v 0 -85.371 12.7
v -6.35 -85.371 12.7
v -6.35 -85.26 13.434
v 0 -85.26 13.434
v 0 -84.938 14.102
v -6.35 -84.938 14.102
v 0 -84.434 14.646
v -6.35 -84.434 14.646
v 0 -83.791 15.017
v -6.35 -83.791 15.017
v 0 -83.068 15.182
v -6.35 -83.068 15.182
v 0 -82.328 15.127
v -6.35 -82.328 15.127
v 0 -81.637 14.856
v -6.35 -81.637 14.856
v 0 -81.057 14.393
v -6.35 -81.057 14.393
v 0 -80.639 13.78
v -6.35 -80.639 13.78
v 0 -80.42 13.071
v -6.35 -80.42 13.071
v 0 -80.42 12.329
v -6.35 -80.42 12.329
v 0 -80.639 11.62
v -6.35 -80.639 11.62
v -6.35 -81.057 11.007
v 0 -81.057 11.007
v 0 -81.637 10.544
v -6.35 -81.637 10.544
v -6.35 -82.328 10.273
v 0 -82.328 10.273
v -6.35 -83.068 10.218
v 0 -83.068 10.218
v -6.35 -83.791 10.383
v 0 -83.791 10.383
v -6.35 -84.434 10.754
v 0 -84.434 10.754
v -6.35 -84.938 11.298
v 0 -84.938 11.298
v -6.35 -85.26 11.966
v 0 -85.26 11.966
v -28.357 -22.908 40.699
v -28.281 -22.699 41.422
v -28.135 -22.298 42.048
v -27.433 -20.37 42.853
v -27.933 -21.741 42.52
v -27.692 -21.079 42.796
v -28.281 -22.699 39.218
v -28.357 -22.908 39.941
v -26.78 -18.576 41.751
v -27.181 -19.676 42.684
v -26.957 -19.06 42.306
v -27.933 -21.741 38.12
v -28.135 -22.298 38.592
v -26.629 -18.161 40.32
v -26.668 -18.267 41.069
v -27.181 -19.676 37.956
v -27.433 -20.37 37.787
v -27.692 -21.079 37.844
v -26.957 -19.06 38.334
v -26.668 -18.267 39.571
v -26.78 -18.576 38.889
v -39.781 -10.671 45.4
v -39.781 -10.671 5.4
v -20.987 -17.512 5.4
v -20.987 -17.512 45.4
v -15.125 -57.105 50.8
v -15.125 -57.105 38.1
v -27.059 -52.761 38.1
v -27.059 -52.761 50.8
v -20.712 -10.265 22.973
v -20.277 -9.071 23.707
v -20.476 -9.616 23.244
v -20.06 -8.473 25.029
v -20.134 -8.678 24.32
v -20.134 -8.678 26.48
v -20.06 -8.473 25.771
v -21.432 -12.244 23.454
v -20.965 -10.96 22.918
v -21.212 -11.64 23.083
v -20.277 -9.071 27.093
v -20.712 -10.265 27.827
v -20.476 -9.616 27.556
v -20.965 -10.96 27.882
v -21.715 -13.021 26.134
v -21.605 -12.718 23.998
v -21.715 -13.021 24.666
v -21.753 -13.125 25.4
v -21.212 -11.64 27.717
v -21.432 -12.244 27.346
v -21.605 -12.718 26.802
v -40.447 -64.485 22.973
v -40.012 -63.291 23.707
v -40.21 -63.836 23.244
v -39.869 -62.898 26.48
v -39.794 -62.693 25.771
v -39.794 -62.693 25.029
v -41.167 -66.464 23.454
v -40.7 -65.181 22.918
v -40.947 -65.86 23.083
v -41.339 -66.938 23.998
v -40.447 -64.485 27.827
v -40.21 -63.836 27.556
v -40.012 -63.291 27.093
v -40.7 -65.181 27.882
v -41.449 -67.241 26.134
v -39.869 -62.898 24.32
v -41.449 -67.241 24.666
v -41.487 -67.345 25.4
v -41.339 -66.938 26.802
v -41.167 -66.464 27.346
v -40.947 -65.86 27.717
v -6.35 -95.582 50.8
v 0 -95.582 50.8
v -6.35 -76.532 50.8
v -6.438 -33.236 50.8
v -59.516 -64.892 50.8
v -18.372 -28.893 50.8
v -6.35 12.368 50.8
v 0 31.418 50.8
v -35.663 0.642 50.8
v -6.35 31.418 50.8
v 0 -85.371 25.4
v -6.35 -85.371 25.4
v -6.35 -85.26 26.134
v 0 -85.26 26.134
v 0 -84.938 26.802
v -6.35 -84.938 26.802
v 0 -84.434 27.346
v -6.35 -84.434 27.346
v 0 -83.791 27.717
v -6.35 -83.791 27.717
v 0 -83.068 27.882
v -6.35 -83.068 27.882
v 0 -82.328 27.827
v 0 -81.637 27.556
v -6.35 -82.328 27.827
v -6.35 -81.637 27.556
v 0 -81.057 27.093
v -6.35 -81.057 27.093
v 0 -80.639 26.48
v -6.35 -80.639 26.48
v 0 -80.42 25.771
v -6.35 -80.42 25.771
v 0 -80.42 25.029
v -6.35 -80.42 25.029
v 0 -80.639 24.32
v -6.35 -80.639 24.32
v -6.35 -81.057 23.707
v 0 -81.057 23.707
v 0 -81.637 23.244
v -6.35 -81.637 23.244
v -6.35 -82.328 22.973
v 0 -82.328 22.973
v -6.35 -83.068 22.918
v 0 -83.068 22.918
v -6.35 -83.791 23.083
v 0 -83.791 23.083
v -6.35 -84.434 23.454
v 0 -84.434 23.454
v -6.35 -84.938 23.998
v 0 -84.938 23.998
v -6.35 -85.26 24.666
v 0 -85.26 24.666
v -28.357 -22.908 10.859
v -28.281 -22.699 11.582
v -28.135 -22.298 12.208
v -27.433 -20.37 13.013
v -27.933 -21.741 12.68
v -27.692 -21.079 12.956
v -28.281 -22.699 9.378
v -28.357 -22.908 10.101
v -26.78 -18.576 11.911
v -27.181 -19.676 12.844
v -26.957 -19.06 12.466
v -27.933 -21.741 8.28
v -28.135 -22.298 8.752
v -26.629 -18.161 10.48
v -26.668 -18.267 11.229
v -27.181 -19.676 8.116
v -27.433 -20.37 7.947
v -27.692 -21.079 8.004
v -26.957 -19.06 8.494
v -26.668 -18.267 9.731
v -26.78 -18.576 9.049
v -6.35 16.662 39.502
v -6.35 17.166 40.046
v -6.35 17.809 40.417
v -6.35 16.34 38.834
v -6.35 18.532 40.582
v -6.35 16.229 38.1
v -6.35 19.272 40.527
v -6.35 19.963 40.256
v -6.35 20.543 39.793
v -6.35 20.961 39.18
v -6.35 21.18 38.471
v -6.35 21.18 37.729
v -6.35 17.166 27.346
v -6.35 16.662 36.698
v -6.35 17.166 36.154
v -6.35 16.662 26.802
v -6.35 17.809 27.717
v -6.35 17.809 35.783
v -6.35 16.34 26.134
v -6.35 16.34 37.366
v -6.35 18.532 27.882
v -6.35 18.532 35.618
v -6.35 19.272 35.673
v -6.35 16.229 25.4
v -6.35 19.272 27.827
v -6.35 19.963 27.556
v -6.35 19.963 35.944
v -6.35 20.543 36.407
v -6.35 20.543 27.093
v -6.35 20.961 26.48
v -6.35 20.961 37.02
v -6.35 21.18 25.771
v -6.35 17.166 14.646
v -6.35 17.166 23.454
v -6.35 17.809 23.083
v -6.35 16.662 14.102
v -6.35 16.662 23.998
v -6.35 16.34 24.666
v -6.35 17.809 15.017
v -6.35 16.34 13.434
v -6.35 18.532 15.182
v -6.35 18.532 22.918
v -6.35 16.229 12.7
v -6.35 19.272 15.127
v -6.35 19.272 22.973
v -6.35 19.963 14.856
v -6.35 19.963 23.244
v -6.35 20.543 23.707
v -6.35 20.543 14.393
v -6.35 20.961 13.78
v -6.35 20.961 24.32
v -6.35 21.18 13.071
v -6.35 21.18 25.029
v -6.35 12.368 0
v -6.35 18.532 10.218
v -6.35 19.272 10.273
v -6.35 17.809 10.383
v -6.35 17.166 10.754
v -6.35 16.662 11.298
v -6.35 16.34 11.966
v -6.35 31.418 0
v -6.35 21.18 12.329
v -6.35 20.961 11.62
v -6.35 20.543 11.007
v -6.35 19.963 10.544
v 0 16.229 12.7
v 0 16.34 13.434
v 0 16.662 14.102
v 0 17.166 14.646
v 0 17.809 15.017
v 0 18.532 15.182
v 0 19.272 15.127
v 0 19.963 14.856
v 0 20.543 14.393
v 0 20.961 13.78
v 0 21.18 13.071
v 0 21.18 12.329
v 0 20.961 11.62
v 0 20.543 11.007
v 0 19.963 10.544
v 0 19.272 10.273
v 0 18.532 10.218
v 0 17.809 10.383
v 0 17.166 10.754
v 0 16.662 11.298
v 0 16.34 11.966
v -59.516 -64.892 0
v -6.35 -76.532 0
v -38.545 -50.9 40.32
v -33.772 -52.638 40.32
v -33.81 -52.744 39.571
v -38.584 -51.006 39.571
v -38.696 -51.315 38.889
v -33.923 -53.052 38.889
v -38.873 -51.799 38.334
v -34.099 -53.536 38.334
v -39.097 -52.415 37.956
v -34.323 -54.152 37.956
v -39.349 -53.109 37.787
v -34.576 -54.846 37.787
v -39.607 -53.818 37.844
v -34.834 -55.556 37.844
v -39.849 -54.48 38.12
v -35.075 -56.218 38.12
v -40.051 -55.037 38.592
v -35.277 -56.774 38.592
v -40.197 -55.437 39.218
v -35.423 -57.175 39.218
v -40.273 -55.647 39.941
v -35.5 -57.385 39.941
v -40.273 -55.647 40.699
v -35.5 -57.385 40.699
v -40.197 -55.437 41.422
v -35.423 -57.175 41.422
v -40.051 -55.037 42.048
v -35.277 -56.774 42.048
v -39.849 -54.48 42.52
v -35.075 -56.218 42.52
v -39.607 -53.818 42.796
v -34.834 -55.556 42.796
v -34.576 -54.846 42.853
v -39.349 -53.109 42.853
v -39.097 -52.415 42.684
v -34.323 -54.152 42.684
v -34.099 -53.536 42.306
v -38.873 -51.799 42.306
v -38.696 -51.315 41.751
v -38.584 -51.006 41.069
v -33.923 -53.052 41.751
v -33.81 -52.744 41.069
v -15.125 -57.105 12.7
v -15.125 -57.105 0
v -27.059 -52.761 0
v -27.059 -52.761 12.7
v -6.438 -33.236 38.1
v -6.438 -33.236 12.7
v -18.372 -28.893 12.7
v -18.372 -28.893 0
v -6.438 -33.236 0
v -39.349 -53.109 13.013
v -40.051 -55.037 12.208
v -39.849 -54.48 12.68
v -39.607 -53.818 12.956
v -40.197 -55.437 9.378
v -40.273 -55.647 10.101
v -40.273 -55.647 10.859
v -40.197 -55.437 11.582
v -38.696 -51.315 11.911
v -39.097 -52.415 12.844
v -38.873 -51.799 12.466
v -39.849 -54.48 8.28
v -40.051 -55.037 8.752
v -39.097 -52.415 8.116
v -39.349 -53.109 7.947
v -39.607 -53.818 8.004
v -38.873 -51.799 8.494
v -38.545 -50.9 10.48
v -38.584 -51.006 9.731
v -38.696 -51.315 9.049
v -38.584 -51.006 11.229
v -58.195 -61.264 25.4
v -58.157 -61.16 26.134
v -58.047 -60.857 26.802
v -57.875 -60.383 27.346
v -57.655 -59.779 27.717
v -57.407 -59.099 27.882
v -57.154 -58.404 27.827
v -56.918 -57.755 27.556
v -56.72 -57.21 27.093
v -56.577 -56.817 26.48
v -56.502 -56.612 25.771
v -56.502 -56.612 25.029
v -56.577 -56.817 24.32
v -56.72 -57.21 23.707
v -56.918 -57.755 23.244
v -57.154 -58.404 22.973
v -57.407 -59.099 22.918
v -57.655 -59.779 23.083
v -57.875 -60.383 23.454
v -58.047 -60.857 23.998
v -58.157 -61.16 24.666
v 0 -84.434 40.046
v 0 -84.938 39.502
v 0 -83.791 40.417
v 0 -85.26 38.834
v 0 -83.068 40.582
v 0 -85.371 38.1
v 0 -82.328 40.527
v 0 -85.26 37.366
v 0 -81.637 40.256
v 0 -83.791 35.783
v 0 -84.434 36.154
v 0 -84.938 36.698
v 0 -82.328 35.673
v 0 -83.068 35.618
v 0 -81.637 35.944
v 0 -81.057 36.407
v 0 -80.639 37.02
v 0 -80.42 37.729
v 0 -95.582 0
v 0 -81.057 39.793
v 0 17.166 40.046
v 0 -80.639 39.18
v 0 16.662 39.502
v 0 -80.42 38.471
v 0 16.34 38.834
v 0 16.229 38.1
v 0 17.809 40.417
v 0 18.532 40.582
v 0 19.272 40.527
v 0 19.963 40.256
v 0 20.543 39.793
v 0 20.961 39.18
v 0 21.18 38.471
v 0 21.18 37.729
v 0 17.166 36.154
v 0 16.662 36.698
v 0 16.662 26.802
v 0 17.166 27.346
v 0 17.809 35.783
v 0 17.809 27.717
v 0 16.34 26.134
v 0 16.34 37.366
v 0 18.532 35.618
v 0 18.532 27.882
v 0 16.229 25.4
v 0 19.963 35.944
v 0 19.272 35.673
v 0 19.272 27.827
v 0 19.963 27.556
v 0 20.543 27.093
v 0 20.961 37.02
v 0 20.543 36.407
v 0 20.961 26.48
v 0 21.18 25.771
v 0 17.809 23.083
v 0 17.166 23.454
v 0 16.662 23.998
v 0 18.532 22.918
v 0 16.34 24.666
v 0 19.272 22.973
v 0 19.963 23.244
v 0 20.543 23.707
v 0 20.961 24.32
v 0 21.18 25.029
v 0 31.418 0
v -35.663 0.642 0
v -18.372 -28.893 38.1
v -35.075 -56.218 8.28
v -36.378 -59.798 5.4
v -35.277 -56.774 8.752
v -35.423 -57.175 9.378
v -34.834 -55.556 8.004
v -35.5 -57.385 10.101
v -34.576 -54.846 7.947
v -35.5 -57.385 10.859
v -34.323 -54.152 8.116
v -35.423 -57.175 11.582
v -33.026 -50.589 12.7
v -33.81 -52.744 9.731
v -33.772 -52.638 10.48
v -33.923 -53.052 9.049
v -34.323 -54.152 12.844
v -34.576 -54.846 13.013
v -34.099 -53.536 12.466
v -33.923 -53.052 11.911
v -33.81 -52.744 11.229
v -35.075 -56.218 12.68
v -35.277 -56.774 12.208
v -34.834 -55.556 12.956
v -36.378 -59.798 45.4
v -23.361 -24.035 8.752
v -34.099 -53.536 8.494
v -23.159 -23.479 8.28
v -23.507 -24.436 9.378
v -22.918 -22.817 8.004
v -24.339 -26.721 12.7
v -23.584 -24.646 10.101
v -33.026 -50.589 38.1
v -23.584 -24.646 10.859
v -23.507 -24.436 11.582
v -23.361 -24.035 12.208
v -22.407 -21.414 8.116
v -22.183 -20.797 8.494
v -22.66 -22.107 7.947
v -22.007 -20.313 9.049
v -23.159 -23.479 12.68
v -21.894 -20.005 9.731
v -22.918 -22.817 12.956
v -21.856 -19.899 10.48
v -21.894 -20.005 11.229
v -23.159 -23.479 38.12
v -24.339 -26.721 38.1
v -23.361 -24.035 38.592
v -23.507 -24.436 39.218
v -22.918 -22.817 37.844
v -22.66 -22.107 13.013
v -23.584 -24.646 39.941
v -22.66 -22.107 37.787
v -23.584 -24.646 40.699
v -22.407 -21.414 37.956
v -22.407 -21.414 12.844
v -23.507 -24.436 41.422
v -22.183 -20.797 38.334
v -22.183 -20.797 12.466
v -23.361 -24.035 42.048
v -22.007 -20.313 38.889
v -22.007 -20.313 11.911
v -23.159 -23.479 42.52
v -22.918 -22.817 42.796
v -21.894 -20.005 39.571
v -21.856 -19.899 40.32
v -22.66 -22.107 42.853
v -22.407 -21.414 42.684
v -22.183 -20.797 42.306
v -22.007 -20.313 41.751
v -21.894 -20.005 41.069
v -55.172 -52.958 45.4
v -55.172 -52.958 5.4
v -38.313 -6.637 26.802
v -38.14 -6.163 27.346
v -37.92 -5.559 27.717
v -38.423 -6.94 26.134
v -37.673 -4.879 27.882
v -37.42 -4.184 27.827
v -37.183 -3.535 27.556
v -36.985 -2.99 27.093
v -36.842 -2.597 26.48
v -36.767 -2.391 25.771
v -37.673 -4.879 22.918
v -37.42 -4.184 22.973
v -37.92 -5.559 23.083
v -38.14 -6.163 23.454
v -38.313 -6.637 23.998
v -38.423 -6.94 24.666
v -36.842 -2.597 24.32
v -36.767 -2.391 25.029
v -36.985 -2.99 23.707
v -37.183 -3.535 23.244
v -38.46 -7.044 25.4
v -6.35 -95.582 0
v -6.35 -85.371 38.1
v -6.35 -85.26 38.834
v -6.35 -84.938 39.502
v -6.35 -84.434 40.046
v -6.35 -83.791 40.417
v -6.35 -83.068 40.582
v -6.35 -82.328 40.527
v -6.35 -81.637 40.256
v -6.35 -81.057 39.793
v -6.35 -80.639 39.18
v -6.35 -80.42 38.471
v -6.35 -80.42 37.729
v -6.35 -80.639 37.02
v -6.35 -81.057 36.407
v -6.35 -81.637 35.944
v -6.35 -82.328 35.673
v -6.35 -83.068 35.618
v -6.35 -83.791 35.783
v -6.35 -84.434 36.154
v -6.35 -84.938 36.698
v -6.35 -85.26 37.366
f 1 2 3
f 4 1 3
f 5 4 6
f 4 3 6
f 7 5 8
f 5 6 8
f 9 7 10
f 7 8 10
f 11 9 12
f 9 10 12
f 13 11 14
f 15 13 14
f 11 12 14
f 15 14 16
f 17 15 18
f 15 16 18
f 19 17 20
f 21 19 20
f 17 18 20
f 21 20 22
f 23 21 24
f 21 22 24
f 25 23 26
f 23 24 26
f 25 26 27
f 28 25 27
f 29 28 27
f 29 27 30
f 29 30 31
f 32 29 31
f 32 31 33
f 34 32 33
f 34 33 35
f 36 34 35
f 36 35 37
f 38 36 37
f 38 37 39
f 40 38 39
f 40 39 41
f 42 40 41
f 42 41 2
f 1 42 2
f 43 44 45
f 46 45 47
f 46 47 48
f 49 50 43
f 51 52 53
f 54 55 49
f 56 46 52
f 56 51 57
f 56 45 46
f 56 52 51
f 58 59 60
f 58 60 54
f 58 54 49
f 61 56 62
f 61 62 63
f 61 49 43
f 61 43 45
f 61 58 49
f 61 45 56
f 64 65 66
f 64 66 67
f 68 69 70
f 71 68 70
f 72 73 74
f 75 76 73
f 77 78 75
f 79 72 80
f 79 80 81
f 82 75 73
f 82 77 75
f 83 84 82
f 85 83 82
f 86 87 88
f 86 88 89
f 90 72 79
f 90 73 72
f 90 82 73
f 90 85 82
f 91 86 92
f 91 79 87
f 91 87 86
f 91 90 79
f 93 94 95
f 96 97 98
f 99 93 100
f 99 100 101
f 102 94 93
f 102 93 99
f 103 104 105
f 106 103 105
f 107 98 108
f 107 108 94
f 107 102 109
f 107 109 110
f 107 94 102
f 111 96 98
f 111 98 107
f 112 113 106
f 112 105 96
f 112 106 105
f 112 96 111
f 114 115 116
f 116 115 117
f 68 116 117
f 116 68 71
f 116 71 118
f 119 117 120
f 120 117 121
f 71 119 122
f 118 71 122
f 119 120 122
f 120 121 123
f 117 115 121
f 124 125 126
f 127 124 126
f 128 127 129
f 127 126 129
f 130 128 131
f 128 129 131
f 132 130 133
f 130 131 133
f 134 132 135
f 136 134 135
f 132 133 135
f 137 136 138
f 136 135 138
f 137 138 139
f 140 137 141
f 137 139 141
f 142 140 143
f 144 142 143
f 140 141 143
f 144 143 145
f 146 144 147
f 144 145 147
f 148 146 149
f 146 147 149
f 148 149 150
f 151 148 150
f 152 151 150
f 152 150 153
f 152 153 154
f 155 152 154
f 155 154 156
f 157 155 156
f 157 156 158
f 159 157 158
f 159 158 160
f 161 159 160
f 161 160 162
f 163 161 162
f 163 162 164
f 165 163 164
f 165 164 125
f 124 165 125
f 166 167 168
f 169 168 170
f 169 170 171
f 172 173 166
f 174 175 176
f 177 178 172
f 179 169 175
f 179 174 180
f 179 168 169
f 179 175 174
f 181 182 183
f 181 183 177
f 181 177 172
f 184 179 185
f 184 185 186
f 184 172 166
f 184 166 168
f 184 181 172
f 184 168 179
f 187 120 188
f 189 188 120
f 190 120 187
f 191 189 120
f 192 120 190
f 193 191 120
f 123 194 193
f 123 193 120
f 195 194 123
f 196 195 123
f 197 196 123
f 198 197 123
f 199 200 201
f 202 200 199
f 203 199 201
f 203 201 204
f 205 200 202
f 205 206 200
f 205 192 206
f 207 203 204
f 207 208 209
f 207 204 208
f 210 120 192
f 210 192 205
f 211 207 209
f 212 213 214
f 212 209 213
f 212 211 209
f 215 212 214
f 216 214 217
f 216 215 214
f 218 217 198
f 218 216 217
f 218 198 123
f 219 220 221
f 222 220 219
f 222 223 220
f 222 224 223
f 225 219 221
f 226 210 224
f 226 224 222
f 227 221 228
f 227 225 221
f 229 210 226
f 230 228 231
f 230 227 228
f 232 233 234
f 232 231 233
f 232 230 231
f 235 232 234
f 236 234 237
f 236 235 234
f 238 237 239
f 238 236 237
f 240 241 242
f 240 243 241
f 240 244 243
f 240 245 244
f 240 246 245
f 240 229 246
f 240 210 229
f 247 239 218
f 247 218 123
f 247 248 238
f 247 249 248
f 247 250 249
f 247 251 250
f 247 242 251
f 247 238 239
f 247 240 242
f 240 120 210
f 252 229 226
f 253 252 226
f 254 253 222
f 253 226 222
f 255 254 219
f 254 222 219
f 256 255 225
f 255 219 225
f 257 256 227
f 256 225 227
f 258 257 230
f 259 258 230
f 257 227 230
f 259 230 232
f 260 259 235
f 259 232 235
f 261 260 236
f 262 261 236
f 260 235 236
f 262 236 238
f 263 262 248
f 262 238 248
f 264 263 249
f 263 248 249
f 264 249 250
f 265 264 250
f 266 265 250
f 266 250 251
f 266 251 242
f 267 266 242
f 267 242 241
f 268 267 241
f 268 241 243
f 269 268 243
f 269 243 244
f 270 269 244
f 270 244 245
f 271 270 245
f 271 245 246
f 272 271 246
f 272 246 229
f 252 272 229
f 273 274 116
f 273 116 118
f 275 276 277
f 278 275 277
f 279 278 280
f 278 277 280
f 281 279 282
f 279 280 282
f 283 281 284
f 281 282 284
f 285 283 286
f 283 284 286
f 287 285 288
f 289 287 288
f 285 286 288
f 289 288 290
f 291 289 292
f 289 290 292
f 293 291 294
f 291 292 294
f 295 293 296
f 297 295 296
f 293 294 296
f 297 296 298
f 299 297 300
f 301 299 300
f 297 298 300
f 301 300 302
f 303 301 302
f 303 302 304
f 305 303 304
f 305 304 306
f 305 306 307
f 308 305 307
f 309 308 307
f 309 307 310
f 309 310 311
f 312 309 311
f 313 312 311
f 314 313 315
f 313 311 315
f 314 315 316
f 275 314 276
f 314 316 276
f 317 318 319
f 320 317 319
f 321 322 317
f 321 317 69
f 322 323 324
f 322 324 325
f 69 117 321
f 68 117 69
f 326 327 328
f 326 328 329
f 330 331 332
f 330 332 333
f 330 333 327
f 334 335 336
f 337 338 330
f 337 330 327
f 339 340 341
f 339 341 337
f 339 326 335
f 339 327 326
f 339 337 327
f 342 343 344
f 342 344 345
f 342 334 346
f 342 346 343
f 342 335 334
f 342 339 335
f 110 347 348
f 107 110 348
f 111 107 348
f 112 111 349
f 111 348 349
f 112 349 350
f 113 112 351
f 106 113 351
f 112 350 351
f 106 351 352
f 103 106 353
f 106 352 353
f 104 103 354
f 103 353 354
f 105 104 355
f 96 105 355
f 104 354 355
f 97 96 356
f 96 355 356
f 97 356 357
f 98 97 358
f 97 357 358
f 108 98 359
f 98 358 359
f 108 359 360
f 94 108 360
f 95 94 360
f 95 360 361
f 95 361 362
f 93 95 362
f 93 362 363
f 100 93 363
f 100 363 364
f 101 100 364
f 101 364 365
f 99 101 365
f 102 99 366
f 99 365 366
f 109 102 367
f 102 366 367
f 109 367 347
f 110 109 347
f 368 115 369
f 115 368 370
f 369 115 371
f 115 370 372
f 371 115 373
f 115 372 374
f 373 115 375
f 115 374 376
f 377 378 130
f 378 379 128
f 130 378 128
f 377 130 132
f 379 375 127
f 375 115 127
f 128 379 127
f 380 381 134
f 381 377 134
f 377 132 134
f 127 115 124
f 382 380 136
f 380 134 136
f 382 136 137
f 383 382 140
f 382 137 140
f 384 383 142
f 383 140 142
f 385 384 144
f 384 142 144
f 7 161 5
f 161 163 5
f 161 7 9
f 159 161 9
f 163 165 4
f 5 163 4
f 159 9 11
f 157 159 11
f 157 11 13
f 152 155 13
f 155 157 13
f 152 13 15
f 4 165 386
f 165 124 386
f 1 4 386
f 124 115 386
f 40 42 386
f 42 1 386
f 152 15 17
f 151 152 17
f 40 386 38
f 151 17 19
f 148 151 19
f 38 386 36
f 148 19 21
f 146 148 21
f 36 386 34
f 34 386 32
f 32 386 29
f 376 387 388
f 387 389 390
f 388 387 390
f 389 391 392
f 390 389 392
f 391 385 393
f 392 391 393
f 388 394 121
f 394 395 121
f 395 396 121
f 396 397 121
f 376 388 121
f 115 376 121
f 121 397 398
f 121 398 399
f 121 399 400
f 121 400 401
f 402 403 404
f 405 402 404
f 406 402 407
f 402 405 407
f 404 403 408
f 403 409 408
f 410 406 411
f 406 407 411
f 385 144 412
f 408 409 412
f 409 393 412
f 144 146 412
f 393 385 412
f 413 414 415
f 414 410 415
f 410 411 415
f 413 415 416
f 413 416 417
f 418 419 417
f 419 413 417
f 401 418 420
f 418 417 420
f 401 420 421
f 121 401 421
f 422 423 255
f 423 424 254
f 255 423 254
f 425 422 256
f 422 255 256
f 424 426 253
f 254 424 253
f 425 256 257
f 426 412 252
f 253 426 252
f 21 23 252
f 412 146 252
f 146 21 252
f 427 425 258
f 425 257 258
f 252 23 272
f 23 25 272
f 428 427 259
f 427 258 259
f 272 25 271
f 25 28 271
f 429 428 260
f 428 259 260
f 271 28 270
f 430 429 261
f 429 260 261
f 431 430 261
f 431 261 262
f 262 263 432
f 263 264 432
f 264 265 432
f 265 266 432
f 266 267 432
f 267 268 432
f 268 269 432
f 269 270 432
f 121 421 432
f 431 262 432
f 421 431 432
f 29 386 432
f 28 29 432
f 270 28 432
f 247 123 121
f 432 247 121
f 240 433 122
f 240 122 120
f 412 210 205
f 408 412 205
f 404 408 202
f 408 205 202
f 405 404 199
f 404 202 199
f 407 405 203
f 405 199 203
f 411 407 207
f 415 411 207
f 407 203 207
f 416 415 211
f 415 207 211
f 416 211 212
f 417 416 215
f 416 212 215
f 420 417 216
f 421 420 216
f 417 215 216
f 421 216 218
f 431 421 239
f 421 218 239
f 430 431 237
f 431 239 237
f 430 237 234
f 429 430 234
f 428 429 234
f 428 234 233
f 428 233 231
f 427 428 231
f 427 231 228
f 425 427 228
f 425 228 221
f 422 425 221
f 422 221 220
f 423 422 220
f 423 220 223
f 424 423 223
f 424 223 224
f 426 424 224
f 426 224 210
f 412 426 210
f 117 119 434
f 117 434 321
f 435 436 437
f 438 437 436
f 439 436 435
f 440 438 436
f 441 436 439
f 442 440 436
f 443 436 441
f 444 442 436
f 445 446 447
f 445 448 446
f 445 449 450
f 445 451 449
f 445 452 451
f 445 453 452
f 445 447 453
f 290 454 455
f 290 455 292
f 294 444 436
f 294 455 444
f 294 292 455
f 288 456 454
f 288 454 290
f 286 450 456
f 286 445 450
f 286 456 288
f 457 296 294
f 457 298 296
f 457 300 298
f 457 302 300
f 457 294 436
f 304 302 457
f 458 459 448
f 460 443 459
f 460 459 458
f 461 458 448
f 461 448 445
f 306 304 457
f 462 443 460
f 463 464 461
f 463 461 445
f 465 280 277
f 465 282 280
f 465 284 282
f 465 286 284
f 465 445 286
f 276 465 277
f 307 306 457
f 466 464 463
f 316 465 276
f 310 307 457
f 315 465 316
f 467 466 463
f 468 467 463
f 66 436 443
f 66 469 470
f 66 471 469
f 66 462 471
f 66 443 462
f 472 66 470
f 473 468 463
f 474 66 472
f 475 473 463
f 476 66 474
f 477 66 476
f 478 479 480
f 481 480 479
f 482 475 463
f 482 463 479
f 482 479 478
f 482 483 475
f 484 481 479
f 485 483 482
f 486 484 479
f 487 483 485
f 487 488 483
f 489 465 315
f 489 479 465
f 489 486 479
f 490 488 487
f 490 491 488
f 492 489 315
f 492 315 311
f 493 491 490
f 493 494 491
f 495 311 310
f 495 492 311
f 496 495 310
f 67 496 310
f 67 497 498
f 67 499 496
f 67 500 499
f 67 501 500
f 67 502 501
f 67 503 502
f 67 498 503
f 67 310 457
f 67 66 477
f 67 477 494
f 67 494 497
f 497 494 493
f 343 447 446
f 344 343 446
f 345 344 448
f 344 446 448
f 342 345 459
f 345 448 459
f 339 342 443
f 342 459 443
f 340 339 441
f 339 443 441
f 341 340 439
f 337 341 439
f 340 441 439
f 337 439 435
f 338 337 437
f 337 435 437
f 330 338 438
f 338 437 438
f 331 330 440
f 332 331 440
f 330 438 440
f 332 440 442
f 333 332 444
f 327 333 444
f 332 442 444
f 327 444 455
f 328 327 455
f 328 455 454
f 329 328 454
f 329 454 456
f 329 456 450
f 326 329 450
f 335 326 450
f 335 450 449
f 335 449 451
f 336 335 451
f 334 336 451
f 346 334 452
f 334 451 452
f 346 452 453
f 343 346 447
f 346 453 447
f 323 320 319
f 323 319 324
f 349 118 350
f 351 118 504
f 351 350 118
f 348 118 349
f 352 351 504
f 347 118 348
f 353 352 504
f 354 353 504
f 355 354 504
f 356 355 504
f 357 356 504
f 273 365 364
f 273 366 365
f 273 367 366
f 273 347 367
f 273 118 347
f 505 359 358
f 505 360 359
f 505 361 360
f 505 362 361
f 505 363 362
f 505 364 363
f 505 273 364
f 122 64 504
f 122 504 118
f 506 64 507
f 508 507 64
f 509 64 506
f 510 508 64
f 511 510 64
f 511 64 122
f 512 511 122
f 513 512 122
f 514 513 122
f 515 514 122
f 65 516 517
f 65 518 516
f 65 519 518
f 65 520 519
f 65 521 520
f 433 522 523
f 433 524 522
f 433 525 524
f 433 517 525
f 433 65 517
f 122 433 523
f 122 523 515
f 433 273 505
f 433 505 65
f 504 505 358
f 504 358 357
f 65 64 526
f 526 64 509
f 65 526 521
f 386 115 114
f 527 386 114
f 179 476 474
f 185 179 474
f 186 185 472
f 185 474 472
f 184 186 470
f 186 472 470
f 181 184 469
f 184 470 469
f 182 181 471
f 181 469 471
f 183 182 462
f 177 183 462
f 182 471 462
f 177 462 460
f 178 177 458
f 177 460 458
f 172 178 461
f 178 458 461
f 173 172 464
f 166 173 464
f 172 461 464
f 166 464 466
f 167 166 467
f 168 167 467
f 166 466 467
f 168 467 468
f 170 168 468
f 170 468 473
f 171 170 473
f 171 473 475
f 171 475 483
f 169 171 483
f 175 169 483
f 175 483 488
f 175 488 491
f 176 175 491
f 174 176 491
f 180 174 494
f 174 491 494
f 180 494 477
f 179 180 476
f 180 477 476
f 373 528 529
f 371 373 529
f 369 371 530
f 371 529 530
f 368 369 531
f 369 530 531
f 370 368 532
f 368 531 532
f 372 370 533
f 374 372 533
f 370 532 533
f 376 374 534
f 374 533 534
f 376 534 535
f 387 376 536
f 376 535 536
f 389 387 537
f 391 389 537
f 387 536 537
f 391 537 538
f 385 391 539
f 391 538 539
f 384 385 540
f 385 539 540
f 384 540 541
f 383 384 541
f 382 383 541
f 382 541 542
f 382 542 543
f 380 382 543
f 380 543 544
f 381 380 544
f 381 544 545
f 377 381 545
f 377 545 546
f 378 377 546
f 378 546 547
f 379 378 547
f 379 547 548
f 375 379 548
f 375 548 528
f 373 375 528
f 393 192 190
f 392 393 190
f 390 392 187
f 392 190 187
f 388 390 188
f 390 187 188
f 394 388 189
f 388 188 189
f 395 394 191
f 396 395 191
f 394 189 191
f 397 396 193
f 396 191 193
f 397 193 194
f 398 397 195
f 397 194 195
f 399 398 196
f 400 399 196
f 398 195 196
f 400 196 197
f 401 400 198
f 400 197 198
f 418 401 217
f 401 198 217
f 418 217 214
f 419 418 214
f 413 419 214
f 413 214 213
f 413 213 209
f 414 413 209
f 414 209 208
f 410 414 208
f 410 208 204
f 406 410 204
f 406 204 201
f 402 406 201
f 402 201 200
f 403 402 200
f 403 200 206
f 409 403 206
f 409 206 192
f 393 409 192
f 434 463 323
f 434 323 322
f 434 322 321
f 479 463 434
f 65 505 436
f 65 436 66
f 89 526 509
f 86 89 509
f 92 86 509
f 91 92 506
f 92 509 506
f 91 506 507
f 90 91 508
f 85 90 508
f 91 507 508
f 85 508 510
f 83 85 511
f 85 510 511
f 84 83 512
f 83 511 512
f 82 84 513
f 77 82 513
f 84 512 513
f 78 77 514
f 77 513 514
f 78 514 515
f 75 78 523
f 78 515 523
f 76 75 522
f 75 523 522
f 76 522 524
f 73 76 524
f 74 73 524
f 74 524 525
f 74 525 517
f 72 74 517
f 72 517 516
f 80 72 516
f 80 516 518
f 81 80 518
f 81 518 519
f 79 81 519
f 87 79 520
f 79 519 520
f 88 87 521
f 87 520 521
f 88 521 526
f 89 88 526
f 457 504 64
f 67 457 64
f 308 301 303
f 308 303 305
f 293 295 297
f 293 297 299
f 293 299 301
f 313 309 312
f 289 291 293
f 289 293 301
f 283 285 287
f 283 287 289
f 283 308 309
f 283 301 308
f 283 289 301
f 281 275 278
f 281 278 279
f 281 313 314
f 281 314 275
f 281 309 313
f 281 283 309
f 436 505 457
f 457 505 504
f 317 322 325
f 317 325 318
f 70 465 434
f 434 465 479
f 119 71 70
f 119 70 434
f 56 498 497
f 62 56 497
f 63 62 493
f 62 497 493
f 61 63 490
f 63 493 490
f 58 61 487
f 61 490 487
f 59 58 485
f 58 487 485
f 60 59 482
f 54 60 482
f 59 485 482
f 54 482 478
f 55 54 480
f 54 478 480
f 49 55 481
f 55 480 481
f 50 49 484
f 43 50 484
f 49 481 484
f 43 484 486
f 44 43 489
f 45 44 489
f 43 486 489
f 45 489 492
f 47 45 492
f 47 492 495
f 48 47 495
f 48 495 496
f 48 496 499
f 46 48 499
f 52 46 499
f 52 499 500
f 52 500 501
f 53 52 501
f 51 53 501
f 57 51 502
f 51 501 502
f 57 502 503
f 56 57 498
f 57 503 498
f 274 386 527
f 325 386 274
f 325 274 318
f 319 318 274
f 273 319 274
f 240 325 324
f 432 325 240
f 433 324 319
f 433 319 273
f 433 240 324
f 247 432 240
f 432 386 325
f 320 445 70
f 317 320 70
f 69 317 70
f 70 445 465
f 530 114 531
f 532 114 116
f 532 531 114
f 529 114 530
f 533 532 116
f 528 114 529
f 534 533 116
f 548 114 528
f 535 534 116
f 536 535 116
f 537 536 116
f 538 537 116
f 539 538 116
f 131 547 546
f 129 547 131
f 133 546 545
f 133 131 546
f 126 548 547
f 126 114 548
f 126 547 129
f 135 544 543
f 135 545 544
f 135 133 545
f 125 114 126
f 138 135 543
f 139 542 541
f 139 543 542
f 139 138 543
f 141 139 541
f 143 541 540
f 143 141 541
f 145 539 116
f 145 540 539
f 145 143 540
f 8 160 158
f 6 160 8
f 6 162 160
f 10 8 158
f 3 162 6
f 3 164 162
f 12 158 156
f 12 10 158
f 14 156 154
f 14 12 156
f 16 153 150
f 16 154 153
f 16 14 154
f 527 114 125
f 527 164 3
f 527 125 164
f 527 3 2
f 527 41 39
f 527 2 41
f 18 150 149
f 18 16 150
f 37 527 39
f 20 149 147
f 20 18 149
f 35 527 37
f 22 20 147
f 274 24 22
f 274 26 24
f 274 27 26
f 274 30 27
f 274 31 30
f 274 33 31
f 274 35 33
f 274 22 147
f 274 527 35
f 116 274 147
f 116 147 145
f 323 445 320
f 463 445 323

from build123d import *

# Parameters (mm, degrees)
BOSS_EXTRUDE1_DEPTH     = 50.8
SKETCH3_W               = 40
SKETCH3_H               = 45
CUT_EXTRUDE1_DEPTH      = 20
SKETCH4_R               = 2.4892
CUT_EXTRUDE2_DEPTH      = 17.78
SKETCH7_W               = 25.4
SKETCH7_H               = 25.4
CUT_EXTRUDE3_DEPTH      = 19.05
CUT_EXTRUDE4_DEPTH      = 119.867767025
CUT_EXTRUDE4_DEPTH_BACK = 119.867767025
SKETCH10_R              = 2.4892
CUT_EXTRUDE5_DEPTH      = 121.594574863
SKETCH11_R              = 2.54
BOSS_EXTRUDE2_DEPTH     = 5.08


with BuildPart() as part:
    # Sketch1 → Boss-Extrude1 (new body)
    with BuildSketch(Plane.XY):
        Polygon((0, 0), (0, -95.581585113), (-6.35, -95.581585113), (-6.35, -76.531585113), (-59.515515832, -64.891735517), (-35.66310566, 0.642222829), (-6.35, 12.368414887), (-6.35, 31.418414887), (0, 31.418414887), align=None)
    extrude(amount=BOSS_EXTRUDE1_DEPTH)

    # Sketch3 → Cut-Extrude1 (cut)
    with BuildSketch(Plane(origin=(-31.697721226, 11.53702702, 0), x_dir=(0, 0, 1), z_dir=(-0.9396926207859081, 0.34202014332566955, 0))):
        with Locations((25.4, -46.13379027)):
            Rectangle(SKETCH3_W, SKETCH3_H)
    extrude(amount=-CUT_EXTRUDE1_DEPTH, mode=Mode.SUBTRACT)

    # Sketch4 → Cut-Extrude2 (cut)
    with BuildSketch(Plane(origin=(-31.697721226, 11.53702702, 0), x_dir=(0, 0, 1), z_dir=(-0.9396926207859081, 0.34202014332566955, 0))):
        with Locations(Location((25.4, -17.28379027, 0), (0, 0, 270))):
            Circle(SKETCH4_R)
        with Locations(Location((25.4, -74.98379027, 0), (0, 0, 270))):
            Circle(SKETCH4_R)
    extrude(amount=-CUT_EXTRUDE2_DEPTH, mode=Mode.SUBTRACT)

    # Sketch7 → Cut-Extrude3 (cut)
    with BuildSketch(Plane(origin=(-12.90386881, 4.696624154, 0), x_dir=(0, 0, 1), z_dir=(-0.9396926207859082, 0.34202014332566955, 0))):
        with Locations((25.4, -46.13379027)):
            Rectangle(SKETCH7_W, SKETCH7_H)
    extrude(amount=-CUT_EXTRUDE3_DEPTH, mode=Mode.SUBTRACT)

    # Sketch9 → Cut-Extrude4 (cut, two sides: drawn at the far end of the back side and taken through both)
    with BuildSketch(Plane(origin=(0, 0, 38.1), x_dir=(-1, 0, 0), z_dir=(0, 0, -1)).offset(-CUT_EXTRUDE4_DEPTH_BACK)):
        Polygon((6.437754125, -33.236345579), (15.125065765, -57.104538146), (27.059162049, -52.760882326), (18.371850409, -28.892689758), align=None)
    extrude(amount=CUT_EXTRUDE4_DEPTH + CUT_EXTRUDE4_DEPTH_BACK, mode=Mode.SUBTRACT)

    # Sketch10 → Cut-Extrude5 (cut, through all)
    with BuildSketch(Plane.ZY.offset(6.35)):
        with Locations(Location((25.4, 18.718414887, 0), (0, 0, 270))):
            Circle(SKETCH10_R)
        with Locations(Location((12.7, 18.718414887, 0), (0, 0, 270))):
            Circle(SKETCH10_R)
        with Locations(Location((12.7, -82.881585113, 0), (0, 0, 270))):
            Circle(SKETCH10_R)
        with Locations(Location((38.1, -82.881585113, 0), (0, 0, 270))):
            Circle(SKETCH10_R)
        with Locations(Location((38.1, 18.718414887, 0), (0, 0, 270))):
            Circle(SKETCH10_R)
        with Locations(Location((25.4, -82.881585113, 0), (0, 0, 270))):
            Circle(SKETCH10_R)
    extrude(amount=-CUT_EXTRUDE5_DEPTH, mode=Mode.SUBTRACT)

    # Sketch11 → Boss-Extrude2 (add)
    with BuildSketch(Plane(origin=(-12.90386881, 4.696624154, 0), x_dir=(0, 0, 1), z_dir=(-0.9396926207859081, 0.3420201433256697, 0))):
        with Locations(Location((10.48, -28.71379027, 0), (0, 0, 90))):
            Circle(SKETCH11_R)
        with Locations(Location((40.32, -28.71379027, 0), (0, 0, 90))):
            Circle(SKETCH11_R)
        with Locations(Location((40.32, -63.55379027, 0), (0, 0, 90))):
            Circle(SKETCH11_R)
        with Locations(Location((10.48, -63.55379027, 0), (0, 0, 90))):
            Circle(SKETCH11_R)
    extrude(amount=BOSS_EXTRUDE2_DEPTH)


solid = part.part
